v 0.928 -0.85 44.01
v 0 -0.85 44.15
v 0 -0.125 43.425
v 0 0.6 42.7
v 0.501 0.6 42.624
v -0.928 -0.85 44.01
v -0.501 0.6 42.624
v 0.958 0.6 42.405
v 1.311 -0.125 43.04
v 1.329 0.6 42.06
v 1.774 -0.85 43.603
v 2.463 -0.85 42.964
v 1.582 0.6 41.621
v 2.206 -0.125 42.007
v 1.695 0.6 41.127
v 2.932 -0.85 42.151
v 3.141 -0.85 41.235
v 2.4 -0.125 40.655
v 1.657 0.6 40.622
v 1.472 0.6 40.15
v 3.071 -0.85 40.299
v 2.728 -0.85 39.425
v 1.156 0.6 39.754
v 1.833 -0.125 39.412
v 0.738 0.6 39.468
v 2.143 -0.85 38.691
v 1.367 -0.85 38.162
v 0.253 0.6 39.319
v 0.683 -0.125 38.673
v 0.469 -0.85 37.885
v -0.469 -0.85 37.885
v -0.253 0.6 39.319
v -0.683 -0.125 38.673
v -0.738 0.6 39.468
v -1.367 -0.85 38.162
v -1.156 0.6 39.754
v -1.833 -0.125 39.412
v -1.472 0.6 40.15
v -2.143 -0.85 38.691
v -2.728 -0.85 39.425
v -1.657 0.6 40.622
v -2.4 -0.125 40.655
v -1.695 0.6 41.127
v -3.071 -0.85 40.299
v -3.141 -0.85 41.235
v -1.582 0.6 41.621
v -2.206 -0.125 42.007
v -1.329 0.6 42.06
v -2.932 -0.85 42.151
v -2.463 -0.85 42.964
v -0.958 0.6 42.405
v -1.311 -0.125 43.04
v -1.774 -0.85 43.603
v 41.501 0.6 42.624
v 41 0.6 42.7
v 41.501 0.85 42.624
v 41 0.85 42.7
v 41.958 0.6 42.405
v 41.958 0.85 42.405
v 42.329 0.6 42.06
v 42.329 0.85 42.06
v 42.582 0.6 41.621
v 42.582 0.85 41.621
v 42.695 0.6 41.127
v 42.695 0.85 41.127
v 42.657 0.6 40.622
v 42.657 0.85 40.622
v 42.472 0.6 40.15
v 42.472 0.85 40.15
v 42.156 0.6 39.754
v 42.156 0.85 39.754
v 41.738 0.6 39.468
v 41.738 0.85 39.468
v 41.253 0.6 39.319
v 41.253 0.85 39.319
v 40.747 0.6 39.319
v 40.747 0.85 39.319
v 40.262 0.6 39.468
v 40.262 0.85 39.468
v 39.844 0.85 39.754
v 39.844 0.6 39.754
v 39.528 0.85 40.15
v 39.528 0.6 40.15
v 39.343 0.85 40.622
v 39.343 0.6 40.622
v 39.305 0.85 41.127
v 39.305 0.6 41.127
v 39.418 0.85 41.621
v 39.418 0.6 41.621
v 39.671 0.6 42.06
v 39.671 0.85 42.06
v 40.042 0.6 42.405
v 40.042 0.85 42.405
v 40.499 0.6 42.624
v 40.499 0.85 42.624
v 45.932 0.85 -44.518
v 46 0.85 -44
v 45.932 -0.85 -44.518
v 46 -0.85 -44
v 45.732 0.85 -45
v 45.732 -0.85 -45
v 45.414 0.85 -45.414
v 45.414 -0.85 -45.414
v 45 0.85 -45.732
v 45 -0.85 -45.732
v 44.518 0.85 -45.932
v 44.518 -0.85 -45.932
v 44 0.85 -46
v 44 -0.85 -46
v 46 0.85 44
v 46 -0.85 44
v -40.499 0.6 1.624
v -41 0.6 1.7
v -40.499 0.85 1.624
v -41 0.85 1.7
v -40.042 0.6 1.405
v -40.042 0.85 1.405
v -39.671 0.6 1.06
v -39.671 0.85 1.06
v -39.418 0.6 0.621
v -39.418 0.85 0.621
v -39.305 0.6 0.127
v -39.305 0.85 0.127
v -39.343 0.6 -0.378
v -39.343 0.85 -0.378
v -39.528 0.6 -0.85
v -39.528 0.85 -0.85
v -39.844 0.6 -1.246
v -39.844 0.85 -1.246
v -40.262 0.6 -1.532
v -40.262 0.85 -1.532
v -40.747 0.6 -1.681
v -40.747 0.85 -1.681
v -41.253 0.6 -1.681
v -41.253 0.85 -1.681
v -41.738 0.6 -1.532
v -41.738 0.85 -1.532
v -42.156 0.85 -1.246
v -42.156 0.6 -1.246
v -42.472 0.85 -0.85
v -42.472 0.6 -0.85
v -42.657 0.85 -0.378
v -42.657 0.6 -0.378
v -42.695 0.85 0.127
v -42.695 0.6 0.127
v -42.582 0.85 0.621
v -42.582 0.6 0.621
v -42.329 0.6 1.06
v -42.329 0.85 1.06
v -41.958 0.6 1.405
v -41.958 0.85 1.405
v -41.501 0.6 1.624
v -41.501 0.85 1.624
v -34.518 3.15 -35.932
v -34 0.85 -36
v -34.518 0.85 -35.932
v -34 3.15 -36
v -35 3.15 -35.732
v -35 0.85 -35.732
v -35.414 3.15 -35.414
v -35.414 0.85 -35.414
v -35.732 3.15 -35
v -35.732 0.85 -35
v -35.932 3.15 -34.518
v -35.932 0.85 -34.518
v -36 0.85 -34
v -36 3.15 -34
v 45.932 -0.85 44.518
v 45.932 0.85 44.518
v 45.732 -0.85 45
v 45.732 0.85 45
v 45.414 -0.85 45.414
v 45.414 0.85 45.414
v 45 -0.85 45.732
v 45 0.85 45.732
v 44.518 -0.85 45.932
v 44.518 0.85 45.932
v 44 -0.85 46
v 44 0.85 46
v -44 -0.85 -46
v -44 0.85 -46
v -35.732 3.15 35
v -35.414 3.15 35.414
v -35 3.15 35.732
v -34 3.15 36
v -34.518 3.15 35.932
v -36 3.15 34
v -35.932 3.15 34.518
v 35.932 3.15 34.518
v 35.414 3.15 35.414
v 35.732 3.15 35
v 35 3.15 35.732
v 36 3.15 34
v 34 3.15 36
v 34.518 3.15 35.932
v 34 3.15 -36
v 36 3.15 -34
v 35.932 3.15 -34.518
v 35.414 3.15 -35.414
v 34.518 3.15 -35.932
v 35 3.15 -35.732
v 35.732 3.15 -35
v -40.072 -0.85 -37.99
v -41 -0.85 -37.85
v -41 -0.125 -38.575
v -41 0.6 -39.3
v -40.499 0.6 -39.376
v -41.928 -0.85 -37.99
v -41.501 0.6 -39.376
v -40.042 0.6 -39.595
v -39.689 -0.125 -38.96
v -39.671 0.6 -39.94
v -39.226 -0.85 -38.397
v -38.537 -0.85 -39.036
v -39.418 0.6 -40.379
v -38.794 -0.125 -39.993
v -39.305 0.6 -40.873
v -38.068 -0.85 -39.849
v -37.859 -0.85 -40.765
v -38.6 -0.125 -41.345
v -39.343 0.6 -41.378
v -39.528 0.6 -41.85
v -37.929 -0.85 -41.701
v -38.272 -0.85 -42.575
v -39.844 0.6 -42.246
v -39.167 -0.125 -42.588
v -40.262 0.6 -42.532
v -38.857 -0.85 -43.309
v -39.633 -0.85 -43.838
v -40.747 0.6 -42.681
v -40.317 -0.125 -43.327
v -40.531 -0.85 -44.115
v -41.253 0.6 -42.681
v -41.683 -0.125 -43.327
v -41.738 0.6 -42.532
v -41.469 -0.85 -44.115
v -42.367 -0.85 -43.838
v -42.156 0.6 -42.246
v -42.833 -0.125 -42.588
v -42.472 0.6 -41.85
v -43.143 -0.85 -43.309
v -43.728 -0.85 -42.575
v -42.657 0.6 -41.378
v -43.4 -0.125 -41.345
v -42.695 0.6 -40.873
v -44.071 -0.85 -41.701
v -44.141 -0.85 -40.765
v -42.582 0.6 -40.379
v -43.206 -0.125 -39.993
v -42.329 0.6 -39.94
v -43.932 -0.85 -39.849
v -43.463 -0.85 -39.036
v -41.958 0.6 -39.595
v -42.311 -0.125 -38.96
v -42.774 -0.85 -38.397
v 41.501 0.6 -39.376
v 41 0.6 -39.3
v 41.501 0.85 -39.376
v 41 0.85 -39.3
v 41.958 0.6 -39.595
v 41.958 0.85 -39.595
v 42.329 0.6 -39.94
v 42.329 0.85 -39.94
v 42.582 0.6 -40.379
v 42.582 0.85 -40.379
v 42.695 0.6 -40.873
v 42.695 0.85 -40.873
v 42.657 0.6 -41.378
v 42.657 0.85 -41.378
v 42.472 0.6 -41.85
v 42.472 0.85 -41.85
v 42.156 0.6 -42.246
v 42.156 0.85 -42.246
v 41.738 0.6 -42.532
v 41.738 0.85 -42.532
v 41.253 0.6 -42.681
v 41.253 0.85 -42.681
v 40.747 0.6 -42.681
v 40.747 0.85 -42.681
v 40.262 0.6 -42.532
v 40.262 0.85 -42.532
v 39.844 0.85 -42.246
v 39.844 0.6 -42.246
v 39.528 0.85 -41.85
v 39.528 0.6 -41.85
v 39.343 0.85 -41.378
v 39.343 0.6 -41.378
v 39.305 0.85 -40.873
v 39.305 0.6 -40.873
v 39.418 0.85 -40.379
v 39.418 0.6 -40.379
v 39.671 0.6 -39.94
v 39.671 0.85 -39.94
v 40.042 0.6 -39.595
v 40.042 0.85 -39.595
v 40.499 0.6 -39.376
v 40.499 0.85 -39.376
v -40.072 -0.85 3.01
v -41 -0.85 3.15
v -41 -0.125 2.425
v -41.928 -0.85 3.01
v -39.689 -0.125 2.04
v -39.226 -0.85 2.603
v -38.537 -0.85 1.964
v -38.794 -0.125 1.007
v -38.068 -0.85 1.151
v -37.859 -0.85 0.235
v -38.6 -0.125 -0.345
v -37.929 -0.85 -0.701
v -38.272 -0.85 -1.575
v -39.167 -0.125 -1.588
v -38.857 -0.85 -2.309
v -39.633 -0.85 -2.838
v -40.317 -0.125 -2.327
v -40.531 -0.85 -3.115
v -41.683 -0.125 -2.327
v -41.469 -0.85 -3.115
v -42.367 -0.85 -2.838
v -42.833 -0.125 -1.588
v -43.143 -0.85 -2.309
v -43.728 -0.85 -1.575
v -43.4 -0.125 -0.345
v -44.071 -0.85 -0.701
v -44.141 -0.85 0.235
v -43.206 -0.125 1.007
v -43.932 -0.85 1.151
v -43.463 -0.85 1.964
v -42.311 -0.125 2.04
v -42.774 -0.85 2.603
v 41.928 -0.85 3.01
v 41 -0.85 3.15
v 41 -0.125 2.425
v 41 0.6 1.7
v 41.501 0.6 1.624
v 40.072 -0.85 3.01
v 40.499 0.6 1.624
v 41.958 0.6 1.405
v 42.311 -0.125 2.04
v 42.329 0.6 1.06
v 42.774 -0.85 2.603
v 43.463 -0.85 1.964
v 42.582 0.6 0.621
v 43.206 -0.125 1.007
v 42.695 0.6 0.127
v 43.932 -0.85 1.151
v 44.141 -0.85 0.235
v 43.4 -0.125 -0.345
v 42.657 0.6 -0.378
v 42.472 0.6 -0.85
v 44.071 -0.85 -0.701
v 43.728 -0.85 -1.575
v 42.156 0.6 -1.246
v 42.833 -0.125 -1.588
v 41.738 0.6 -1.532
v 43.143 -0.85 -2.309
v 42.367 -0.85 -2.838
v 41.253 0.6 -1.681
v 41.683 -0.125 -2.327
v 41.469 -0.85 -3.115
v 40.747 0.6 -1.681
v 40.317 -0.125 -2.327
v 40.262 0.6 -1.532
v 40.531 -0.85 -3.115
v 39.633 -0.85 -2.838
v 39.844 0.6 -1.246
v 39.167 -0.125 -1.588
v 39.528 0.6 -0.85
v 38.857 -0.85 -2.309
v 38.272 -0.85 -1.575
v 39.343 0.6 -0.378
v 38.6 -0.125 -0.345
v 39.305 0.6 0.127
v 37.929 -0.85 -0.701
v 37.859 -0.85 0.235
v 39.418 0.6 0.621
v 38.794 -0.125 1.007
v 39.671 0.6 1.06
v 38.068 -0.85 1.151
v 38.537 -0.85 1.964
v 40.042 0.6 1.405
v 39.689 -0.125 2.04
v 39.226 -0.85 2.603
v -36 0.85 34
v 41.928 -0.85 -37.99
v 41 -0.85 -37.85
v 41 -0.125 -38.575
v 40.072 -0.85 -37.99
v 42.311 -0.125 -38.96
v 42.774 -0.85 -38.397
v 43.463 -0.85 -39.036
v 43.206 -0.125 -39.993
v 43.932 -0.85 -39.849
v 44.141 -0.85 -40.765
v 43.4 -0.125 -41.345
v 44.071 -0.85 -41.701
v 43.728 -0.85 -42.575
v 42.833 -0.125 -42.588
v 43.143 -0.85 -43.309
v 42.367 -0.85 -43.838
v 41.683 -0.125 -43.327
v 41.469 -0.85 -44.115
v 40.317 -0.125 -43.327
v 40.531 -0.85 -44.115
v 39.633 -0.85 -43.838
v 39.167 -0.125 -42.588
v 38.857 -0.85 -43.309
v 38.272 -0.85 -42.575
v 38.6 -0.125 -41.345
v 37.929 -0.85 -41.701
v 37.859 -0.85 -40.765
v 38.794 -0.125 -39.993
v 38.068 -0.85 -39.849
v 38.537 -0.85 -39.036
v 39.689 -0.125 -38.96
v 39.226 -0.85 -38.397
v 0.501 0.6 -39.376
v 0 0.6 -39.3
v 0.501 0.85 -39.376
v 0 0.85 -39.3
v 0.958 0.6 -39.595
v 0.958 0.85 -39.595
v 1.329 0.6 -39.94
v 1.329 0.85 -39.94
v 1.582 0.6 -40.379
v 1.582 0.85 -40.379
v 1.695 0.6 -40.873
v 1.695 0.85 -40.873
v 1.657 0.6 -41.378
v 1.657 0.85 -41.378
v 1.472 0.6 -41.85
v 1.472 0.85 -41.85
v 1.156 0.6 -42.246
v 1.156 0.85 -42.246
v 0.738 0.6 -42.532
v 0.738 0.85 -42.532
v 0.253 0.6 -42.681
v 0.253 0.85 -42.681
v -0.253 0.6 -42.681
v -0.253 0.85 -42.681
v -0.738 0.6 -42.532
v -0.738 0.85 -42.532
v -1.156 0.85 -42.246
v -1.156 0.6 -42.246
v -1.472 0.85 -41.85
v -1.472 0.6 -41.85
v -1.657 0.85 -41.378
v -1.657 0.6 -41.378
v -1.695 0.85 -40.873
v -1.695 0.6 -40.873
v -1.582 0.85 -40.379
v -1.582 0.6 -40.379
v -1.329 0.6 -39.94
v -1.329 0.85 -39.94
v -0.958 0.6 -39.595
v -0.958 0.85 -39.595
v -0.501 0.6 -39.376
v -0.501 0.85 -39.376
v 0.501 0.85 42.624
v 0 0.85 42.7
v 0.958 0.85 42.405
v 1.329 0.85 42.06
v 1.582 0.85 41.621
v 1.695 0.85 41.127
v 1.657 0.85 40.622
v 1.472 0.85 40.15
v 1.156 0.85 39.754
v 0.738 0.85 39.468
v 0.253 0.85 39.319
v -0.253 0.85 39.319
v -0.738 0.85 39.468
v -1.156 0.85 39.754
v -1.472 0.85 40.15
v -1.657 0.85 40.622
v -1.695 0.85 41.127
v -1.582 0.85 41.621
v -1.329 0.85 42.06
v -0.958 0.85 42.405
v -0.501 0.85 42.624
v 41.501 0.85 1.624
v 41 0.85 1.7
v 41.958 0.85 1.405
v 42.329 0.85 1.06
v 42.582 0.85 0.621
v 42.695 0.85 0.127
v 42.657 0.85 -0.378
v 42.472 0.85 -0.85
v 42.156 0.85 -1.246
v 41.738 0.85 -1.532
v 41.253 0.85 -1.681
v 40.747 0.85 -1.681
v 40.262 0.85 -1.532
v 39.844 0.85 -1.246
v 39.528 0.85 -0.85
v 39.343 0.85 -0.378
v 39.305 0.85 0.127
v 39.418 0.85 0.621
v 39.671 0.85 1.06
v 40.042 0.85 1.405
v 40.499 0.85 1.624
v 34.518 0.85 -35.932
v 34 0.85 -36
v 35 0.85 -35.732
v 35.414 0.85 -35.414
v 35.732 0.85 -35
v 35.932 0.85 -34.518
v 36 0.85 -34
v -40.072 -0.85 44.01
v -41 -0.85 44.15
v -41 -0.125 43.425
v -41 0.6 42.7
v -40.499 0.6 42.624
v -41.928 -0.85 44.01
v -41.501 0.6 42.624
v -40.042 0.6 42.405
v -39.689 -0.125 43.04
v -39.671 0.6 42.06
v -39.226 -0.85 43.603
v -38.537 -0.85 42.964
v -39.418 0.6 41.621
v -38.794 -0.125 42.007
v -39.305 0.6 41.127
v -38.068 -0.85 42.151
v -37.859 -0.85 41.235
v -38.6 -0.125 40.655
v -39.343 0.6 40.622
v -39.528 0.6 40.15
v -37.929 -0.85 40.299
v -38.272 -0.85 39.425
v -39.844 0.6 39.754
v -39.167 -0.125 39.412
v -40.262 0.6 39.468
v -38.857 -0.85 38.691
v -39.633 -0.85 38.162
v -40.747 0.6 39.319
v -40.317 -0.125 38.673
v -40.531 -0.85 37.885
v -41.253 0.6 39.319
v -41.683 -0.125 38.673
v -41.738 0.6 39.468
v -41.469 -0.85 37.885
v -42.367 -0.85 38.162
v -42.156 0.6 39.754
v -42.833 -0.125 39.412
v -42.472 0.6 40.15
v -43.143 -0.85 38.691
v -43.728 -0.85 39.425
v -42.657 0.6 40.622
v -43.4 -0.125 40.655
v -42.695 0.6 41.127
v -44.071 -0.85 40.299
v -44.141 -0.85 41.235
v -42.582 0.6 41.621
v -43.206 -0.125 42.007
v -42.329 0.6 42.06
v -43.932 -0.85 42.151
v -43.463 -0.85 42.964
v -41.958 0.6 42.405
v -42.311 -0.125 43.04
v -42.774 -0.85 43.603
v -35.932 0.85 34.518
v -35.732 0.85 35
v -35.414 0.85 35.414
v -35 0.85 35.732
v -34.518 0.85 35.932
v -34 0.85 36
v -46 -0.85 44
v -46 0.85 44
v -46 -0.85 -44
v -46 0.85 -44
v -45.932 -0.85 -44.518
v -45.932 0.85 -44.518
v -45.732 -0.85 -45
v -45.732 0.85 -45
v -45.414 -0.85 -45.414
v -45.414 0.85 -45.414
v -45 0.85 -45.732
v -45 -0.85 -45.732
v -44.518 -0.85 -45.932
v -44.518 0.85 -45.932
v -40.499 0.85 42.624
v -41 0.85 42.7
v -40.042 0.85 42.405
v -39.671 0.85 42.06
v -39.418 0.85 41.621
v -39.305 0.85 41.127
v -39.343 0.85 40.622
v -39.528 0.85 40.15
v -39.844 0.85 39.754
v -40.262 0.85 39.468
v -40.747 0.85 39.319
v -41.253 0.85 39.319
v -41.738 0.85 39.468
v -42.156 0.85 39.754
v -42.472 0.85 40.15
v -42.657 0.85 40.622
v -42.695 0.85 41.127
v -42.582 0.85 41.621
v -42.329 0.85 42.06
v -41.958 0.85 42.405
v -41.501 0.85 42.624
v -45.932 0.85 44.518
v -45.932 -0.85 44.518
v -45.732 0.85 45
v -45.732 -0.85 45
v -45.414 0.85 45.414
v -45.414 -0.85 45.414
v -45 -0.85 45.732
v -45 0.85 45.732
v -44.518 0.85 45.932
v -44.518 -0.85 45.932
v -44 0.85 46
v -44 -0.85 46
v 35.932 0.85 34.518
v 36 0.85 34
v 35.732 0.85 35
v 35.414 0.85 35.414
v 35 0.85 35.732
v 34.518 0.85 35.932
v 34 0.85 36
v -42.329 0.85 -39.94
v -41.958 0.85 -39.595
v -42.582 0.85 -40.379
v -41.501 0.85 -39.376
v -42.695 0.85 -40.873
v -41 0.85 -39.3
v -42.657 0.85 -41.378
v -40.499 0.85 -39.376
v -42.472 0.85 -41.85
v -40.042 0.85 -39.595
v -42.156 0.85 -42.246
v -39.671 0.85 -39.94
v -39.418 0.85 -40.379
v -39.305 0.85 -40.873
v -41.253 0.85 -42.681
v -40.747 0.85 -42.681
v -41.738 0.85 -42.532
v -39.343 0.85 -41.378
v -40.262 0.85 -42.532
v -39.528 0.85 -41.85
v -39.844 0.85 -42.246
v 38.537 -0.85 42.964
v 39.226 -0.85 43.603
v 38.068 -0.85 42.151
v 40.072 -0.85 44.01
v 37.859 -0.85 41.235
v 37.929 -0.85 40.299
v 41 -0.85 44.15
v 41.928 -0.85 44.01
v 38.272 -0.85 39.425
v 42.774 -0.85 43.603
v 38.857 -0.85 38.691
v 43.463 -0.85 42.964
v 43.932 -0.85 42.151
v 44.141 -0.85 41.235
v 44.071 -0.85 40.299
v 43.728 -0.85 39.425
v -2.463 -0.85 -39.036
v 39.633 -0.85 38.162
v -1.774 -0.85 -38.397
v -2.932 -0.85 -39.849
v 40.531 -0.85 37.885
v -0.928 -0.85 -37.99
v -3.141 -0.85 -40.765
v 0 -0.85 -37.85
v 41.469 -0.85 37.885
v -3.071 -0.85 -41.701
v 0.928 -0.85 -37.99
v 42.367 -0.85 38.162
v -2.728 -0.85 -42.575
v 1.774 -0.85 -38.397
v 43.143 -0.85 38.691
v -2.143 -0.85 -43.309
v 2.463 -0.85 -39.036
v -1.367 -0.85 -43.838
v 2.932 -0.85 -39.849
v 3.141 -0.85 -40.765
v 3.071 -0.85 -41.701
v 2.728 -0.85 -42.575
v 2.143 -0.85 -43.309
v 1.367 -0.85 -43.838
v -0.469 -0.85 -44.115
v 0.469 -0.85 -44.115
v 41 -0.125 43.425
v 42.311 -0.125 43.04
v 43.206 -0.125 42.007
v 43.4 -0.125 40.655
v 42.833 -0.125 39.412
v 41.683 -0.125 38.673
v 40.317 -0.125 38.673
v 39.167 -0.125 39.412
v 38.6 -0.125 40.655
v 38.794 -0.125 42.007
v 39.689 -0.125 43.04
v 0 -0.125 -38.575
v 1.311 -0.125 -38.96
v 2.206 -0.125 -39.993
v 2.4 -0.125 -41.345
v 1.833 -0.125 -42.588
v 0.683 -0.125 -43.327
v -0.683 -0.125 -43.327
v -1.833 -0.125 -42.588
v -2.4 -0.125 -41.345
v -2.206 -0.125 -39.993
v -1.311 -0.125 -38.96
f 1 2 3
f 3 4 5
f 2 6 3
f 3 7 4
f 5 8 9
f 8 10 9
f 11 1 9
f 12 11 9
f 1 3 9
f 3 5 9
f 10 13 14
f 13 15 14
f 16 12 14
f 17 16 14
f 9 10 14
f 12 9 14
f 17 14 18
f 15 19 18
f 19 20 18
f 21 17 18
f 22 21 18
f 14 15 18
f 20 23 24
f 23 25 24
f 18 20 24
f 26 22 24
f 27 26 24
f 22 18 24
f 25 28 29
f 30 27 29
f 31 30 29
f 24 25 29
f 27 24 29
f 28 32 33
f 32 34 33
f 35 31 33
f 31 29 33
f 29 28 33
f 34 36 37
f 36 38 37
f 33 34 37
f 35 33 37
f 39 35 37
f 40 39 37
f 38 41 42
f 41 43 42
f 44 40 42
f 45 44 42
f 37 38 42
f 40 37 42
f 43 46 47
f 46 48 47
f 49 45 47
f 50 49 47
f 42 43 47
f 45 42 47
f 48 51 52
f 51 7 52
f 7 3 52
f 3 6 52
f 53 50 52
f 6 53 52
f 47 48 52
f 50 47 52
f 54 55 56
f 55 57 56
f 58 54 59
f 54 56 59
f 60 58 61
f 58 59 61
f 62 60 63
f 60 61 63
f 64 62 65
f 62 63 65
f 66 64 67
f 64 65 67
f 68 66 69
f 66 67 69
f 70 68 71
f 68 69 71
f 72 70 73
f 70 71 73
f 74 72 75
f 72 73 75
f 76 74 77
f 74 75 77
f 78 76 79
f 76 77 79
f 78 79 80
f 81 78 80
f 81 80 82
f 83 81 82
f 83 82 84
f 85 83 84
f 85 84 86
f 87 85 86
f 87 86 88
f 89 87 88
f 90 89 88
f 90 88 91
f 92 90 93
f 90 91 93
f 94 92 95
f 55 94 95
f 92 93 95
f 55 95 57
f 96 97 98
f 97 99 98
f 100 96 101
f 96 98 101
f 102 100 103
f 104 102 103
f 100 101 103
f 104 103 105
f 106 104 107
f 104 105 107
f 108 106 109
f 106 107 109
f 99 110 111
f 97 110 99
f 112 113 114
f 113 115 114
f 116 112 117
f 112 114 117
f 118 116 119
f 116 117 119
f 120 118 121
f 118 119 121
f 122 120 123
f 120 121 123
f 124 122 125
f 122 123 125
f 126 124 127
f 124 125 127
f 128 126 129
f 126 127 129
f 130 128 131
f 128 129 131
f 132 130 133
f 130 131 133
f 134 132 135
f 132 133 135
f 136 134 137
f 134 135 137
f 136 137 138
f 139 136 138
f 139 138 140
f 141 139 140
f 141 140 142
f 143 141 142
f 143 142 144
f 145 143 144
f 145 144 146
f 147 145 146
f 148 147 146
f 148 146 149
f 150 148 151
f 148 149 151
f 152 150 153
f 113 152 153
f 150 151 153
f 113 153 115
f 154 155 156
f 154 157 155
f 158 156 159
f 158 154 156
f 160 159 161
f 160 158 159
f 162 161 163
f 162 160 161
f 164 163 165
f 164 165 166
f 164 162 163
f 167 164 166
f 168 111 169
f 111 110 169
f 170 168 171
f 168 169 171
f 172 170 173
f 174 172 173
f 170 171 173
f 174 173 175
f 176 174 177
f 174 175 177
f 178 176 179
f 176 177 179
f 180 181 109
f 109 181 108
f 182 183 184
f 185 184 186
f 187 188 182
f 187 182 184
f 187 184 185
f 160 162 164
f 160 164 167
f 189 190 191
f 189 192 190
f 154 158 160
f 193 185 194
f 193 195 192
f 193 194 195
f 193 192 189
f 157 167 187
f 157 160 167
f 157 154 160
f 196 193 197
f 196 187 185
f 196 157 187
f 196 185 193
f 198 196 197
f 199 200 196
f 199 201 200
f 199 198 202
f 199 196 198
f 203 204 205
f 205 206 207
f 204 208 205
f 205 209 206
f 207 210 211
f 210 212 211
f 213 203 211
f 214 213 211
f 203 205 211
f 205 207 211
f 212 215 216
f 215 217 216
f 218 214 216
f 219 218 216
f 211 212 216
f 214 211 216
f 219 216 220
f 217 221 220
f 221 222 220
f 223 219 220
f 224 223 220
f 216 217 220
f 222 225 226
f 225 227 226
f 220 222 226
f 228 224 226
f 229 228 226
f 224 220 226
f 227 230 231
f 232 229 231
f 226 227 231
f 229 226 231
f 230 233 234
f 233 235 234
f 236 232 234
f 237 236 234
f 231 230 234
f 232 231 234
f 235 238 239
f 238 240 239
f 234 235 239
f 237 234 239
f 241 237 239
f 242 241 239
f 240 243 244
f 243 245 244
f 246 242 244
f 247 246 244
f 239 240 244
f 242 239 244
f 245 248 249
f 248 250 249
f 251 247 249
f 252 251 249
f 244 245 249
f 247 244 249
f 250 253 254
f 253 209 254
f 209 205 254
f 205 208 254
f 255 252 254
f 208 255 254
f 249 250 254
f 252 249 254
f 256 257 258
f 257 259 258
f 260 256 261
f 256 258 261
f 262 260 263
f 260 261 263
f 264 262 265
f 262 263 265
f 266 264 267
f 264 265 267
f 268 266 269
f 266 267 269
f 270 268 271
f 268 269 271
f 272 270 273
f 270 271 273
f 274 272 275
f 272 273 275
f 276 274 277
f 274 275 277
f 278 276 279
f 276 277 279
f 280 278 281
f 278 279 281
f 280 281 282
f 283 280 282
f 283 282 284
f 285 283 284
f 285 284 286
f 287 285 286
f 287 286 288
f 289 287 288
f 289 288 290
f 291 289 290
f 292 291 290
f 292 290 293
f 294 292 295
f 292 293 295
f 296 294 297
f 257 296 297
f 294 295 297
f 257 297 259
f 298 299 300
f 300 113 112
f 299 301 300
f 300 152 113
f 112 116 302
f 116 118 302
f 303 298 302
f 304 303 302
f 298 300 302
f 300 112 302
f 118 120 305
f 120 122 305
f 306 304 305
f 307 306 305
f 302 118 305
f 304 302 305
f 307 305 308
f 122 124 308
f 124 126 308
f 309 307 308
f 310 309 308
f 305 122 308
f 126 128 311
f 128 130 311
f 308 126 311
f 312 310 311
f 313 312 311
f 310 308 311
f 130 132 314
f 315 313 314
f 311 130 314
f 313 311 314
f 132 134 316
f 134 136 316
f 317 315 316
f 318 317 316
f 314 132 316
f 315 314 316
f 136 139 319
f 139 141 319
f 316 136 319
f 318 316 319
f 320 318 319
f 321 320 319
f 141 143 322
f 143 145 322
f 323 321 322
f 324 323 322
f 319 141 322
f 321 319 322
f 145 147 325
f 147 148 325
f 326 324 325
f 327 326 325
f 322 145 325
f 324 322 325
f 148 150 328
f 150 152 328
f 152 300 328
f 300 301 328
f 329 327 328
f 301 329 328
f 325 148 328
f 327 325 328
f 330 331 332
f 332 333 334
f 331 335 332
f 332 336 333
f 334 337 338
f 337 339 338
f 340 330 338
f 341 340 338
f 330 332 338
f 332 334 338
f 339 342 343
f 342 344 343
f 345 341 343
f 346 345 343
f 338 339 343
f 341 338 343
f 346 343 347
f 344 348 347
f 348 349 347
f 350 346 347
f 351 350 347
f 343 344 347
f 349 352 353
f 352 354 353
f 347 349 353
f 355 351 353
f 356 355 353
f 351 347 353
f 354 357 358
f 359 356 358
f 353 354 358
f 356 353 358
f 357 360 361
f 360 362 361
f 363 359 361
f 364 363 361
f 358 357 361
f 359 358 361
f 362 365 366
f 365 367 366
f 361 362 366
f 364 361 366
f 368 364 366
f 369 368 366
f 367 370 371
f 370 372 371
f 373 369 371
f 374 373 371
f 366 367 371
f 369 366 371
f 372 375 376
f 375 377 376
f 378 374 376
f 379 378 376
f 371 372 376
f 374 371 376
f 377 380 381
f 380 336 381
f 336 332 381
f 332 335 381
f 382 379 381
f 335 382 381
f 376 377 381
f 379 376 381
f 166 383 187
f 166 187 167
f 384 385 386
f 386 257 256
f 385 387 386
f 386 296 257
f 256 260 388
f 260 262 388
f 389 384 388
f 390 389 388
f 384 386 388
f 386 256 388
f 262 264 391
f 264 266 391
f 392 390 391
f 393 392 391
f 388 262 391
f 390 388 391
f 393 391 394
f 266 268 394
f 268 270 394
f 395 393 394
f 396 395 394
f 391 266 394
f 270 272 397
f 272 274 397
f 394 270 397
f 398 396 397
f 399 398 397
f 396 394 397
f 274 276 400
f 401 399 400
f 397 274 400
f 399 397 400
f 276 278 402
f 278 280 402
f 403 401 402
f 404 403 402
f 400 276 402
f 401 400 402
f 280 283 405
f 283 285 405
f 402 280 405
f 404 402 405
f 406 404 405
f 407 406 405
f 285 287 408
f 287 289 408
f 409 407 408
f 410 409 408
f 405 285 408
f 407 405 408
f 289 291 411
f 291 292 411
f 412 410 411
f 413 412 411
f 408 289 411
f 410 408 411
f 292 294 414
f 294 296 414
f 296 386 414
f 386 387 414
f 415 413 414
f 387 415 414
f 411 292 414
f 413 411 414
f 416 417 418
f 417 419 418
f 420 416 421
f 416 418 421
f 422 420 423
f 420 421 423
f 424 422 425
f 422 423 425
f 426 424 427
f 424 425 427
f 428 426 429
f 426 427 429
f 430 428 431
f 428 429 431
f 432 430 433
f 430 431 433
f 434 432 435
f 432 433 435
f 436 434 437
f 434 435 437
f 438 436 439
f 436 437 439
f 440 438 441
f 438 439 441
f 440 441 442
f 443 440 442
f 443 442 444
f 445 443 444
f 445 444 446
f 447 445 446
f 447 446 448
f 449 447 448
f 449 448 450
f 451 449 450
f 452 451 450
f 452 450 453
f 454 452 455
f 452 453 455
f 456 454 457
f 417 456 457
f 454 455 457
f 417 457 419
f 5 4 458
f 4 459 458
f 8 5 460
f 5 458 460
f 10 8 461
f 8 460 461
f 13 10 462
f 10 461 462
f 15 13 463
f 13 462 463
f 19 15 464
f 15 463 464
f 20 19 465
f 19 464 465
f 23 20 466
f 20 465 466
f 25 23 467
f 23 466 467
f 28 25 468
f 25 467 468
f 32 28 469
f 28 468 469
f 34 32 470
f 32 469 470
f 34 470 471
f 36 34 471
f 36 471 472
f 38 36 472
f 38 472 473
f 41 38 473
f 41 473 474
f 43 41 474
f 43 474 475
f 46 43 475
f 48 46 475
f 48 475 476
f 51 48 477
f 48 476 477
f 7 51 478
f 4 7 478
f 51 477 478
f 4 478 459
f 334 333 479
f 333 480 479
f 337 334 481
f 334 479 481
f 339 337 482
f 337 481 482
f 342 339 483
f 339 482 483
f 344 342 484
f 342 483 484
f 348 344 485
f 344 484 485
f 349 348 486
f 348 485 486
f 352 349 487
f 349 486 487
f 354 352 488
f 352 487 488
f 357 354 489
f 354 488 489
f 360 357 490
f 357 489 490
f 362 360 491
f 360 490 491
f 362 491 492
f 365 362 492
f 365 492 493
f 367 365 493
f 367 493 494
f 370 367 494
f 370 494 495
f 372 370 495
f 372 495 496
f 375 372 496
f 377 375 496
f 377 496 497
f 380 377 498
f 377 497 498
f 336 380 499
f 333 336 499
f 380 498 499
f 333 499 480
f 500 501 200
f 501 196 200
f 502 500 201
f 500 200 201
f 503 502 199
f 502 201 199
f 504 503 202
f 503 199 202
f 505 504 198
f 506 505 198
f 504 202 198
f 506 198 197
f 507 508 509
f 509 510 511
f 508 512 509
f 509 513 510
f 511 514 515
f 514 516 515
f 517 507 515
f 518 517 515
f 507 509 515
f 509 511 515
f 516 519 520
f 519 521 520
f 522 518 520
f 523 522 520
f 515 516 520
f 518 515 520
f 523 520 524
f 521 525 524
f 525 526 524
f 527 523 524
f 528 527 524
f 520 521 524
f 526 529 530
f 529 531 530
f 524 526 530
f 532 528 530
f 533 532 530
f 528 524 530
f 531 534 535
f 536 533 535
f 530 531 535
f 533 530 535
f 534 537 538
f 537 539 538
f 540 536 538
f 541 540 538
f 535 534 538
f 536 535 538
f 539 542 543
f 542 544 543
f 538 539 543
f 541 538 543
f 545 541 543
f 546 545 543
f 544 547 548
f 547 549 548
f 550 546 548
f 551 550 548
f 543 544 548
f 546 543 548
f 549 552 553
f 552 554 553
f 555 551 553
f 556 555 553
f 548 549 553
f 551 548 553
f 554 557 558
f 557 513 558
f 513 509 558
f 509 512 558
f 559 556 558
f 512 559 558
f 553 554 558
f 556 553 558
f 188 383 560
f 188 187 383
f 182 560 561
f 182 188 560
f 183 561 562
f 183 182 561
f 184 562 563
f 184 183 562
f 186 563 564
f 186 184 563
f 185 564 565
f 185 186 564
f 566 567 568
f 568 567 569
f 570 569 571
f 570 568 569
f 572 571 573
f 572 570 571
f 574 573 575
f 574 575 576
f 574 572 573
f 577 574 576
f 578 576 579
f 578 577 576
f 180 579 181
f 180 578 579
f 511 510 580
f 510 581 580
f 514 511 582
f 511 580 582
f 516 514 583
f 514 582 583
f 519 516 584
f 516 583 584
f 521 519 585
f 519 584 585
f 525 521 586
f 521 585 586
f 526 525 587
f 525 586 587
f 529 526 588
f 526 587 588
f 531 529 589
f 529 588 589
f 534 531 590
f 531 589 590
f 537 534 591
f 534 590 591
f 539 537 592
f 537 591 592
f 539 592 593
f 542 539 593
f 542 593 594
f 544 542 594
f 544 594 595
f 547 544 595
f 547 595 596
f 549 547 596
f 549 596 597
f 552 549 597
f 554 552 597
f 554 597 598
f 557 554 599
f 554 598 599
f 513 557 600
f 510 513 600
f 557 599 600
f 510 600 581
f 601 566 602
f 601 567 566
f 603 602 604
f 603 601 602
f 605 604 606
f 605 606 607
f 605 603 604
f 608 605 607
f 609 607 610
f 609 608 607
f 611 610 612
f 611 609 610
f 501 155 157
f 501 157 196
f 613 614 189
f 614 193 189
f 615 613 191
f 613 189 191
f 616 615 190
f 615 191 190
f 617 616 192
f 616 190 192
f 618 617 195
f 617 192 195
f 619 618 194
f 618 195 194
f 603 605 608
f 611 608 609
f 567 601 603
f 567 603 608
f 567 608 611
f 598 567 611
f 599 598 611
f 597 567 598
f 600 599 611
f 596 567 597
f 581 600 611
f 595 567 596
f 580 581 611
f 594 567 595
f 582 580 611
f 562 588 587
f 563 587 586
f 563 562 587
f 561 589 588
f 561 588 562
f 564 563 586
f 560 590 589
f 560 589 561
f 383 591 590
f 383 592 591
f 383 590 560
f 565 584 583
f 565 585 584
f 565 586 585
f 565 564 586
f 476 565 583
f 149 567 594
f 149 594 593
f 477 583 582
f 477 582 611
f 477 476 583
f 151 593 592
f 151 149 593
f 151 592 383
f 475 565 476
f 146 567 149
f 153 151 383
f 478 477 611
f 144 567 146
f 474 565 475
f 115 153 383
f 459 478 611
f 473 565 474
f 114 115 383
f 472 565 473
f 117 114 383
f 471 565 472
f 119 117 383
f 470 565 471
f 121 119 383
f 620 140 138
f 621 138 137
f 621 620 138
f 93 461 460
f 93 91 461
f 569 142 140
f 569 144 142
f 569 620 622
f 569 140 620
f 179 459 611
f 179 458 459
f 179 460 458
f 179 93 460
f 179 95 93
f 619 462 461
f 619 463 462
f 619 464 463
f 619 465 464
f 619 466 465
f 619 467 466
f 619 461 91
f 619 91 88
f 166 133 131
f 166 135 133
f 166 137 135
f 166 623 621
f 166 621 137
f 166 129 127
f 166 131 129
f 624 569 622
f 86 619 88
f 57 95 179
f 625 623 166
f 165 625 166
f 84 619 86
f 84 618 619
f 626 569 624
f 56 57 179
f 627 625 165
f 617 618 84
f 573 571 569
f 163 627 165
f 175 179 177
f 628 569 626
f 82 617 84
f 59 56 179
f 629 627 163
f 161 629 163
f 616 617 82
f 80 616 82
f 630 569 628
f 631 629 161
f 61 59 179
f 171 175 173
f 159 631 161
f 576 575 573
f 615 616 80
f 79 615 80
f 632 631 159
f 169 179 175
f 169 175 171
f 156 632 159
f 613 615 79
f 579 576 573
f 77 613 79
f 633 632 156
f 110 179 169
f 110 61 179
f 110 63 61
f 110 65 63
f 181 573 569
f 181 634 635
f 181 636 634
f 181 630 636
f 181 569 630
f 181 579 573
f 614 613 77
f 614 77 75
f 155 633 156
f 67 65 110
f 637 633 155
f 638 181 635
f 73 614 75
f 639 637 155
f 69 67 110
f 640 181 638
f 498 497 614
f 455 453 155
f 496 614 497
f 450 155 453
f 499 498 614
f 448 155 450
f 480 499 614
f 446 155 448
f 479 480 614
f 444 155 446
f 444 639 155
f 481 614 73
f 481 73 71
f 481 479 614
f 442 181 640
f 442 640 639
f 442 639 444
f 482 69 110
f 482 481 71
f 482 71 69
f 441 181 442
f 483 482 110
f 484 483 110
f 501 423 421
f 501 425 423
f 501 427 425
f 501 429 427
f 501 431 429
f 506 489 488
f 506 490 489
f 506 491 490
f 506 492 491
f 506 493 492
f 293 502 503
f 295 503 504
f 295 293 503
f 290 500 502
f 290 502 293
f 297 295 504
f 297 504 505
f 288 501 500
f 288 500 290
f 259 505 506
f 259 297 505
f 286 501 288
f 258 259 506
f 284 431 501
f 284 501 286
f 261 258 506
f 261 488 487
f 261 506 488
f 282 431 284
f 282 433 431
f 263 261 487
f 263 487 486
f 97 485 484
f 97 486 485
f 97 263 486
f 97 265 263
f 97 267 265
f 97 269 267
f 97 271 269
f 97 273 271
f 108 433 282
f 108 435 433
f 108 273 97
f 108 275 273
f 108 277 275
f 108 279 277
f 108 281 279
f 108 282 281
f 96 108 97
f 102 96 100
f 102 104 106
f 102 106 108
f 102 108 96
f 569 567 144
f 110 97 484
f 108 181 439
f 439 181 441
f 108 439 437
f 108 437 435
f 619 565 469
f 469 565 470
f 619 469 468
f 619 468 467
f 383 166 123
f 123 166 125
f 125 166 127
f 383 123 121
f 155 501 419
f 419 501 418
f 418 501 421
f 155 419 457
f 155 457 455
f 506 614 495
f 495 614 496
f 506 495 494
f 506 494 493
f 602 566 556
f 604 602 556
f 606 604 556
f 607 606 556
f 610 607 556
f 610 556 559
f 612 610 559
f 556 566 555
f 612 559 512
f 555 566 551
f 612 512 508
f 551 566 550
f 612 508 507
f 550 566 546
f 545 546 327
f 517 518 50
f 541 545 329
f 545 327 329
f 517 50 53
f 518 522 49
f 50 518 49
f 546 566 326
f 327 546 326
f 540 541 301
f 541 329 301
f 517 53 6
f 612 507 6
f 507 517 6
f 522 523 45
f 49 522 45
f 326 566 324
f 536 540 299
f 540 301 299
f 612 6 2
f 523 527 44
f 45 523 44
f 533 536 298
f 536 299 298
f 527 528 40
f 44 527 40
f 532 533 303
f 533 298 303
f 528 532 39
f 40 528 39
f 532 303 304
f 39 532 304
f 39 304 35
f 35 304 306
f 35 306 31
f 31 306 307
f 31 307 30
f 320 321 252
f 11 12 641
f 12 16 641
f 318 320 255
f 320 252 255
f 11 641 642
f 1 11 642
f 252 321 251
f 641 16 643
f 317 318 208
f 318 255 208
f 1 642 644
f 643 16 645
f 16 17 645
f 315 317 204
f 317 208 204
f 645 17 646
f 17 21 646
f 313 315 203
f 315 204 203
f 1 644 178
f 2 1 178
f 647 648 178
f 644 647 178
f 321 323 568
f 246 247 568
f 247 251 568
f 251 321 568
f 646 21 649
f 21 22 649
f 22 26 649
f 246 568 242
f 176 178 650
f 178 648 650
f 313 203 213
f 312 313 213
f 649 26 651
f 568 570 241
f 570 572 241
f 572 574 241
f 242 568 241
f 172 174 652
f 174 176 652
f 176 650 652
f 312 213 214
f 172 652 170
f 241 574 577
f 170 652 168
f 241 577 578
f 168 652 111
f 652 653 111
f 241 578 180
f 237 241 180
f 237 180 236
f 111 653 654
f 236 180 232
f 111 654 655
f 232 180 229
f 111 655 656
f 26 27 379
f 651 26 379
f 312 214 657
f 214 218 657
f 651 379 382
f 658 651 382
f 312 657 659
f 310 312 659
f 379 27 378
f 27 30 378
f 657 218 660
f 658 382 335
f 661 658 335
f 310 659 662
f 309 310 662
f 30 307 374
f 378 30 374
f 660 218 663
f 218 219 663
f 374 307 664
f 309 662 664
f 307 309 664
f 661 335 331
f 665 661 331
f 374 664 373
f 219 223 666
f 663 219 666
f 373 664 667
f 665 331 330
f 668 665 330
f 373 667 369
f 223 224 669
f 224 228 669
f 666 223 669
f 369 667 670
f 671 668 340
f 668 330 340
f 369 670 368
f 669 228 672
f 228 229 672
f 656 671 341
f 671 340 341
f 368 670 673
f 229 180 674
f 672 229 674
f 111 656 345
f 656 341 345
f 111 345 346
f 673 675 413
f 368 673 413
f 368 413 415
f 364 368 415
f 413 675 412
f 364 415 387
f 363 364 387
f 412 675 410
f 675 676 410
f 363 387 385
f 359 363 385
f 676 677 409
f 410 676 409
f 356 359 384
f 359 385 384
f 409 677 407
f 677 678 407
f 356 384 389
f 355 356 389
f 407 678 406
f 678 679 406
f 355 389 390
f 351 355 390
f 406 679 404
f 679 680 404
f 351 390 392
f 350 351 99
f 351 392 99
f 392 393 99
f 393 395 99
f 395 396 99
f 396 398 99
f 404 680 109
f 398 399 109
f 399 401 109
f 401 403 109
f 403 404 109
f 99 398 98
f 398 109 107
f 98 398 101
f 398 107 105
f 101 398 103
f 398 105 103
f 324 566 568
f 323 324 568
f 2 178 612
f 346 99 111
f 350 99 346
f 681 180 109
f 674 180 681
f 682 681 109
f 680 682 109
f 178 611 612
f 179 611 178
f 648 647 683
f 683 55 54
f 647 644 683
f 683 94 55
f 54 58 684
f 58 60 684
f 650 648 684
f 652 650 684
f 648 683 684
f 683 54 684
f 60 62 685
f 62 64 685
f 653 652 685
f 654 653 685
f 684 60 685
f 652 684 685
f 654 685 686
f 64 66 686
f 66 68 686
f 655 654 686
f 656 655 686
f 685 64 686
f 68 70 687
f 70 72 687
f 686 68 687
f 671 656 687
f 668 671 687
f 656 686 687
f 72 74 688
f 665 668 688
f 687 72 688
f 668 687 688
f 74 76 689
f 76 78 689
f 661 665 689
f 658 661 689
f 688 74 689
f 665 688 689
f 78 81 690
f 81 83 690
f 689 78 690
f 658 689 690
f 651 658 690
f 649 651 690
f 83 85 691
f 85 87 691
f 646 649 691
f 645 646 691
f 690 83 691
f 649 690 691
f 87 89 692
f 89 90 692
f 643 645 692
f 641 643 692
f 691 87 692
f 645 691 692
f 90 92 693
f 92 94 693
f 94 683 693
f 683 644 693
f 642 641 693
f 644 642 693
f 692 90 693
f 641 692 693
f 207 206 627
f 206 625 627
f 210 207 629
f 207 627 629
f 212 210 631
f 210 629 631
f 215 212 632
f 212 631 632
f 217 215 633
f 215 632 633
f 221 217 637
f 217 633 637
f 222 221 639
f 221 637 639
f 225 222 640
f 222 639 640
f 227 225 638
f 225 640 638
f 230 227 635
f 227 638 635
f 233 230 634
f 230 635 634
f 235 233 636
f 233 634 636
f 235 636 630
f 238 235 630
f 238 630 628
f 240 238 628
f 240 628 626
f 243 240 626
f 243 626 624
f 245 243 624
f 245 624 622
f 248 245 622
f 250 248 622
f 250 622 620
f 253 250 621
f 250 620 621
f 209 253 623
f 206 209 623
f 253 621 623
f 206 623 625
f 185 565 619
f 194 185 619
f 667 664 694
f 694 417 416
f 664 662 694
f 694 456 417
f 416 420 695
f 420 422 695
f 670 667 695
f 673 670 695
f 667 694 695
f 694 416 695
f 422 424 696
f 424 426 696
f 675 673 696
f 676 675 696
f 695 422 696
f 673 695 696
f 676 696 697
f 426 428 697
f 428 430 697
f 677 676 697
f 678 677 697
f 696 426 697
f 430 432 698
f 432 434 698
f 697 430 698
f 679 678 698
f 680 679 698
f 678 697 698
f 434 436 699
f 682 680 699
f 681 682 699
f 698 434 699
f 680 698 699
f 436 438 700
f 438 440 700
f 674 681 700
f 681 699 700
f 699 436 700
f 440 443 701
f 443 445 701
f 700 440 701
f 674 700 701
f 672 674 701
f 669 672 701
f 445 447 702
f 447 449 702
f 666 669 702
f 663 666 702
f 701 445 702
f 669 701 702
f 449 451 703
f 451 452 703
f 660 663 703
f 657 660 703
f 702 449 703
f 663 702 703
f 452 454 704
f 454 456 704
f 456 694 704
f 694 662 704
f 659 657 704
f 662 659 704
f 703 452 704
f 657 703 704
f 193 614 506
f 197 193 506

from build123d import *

# Parameters (mm, degrees)
SKETCH1_W                                       = 92
SKETCH1_H                                       = 92
BOSS_EXTRUDE1_DEPTH                             = 0.85
SKETCH2_W                                       = 72
SKETCH2_H                                       = 72
BOSS_EXTRUDE2_DEPTH                             = 2.3
CSK_FOR_M3_FLAT_HEAD_MACHINE_SCREW1_D           = 3.4
CSK_FOR_M3_FLAT_HEAD_MACHINE_SCREW1_CSINK_D     = 6.3
CSK_FOR_M3_FLAT_HEAD_MACHINE_SCREW1_CSINK_ANGLE = 90
FILLET1_R                                       = 2


with BuildPart() as part:
    # Sketch1 → Boss-Extrude1 (new, symmetric)
    with BuildSketch(Plane(origin=(0, 0, 0), x_dir=(1, 0, 0), z_dir=(0, 1, 0))):
        Rectangle(SKETCH1_W, SKETCH1_H)
    extrude(amount=BOSS_EXTRUDE1_DEPTH, both=True)

    # Sketch2 → Boss-Extrude2 (add)
    with BuildSketch(Plane(origin=(0, 0.85, 0), x_dir=(1, 0, 0), z_dir=(0, 1, 0))):
        Rectangle(SKETCH2_W, SKETCH2_H)
    extrude(amount=BOSS_EXTRUDE2_DEPTH)

    # CSK for M3 Flat Head Machine Screw1 (through all)
    with Locations(Plane(origin=(-41, -0.85, 41), x_dir=(0, 0, -1), z_dir=(0, -1, 0))):
        with Locations((0, 0), (0, 41), (0, 82), (41, 82), (82, 82), (82, 41), (82, 0), (41, 0)):
            CounterSinkHole(CSK_FOR_M3_FLAT_HEAD_MACHINE_SCREW1_D / 2, CSK_FOR_M3_FLAT_HEAD_MACHINE_SCREW1_CSINK_D / 2, counter_sink_angle=CSK_FOR_M3_FLAT_HEAD_MACHINE_SCREW1_CSINK_ANGLE)

    # Fillet1
    fillet1_edges = [part.edges().sort_by_distance(p)[0] for p in [
        (36, 2, 36),
        (36, 2, -36),
        (-36, 2, -36),
        (-36, 2, 36),
        (46, 0, 46),
        (-46, 0, 46),
        (-46, 0, -46),
        (46, 0, -46),
    ]]
    fillet(fillet1_edges, radius=FILLET1_R)


solid = part.part
